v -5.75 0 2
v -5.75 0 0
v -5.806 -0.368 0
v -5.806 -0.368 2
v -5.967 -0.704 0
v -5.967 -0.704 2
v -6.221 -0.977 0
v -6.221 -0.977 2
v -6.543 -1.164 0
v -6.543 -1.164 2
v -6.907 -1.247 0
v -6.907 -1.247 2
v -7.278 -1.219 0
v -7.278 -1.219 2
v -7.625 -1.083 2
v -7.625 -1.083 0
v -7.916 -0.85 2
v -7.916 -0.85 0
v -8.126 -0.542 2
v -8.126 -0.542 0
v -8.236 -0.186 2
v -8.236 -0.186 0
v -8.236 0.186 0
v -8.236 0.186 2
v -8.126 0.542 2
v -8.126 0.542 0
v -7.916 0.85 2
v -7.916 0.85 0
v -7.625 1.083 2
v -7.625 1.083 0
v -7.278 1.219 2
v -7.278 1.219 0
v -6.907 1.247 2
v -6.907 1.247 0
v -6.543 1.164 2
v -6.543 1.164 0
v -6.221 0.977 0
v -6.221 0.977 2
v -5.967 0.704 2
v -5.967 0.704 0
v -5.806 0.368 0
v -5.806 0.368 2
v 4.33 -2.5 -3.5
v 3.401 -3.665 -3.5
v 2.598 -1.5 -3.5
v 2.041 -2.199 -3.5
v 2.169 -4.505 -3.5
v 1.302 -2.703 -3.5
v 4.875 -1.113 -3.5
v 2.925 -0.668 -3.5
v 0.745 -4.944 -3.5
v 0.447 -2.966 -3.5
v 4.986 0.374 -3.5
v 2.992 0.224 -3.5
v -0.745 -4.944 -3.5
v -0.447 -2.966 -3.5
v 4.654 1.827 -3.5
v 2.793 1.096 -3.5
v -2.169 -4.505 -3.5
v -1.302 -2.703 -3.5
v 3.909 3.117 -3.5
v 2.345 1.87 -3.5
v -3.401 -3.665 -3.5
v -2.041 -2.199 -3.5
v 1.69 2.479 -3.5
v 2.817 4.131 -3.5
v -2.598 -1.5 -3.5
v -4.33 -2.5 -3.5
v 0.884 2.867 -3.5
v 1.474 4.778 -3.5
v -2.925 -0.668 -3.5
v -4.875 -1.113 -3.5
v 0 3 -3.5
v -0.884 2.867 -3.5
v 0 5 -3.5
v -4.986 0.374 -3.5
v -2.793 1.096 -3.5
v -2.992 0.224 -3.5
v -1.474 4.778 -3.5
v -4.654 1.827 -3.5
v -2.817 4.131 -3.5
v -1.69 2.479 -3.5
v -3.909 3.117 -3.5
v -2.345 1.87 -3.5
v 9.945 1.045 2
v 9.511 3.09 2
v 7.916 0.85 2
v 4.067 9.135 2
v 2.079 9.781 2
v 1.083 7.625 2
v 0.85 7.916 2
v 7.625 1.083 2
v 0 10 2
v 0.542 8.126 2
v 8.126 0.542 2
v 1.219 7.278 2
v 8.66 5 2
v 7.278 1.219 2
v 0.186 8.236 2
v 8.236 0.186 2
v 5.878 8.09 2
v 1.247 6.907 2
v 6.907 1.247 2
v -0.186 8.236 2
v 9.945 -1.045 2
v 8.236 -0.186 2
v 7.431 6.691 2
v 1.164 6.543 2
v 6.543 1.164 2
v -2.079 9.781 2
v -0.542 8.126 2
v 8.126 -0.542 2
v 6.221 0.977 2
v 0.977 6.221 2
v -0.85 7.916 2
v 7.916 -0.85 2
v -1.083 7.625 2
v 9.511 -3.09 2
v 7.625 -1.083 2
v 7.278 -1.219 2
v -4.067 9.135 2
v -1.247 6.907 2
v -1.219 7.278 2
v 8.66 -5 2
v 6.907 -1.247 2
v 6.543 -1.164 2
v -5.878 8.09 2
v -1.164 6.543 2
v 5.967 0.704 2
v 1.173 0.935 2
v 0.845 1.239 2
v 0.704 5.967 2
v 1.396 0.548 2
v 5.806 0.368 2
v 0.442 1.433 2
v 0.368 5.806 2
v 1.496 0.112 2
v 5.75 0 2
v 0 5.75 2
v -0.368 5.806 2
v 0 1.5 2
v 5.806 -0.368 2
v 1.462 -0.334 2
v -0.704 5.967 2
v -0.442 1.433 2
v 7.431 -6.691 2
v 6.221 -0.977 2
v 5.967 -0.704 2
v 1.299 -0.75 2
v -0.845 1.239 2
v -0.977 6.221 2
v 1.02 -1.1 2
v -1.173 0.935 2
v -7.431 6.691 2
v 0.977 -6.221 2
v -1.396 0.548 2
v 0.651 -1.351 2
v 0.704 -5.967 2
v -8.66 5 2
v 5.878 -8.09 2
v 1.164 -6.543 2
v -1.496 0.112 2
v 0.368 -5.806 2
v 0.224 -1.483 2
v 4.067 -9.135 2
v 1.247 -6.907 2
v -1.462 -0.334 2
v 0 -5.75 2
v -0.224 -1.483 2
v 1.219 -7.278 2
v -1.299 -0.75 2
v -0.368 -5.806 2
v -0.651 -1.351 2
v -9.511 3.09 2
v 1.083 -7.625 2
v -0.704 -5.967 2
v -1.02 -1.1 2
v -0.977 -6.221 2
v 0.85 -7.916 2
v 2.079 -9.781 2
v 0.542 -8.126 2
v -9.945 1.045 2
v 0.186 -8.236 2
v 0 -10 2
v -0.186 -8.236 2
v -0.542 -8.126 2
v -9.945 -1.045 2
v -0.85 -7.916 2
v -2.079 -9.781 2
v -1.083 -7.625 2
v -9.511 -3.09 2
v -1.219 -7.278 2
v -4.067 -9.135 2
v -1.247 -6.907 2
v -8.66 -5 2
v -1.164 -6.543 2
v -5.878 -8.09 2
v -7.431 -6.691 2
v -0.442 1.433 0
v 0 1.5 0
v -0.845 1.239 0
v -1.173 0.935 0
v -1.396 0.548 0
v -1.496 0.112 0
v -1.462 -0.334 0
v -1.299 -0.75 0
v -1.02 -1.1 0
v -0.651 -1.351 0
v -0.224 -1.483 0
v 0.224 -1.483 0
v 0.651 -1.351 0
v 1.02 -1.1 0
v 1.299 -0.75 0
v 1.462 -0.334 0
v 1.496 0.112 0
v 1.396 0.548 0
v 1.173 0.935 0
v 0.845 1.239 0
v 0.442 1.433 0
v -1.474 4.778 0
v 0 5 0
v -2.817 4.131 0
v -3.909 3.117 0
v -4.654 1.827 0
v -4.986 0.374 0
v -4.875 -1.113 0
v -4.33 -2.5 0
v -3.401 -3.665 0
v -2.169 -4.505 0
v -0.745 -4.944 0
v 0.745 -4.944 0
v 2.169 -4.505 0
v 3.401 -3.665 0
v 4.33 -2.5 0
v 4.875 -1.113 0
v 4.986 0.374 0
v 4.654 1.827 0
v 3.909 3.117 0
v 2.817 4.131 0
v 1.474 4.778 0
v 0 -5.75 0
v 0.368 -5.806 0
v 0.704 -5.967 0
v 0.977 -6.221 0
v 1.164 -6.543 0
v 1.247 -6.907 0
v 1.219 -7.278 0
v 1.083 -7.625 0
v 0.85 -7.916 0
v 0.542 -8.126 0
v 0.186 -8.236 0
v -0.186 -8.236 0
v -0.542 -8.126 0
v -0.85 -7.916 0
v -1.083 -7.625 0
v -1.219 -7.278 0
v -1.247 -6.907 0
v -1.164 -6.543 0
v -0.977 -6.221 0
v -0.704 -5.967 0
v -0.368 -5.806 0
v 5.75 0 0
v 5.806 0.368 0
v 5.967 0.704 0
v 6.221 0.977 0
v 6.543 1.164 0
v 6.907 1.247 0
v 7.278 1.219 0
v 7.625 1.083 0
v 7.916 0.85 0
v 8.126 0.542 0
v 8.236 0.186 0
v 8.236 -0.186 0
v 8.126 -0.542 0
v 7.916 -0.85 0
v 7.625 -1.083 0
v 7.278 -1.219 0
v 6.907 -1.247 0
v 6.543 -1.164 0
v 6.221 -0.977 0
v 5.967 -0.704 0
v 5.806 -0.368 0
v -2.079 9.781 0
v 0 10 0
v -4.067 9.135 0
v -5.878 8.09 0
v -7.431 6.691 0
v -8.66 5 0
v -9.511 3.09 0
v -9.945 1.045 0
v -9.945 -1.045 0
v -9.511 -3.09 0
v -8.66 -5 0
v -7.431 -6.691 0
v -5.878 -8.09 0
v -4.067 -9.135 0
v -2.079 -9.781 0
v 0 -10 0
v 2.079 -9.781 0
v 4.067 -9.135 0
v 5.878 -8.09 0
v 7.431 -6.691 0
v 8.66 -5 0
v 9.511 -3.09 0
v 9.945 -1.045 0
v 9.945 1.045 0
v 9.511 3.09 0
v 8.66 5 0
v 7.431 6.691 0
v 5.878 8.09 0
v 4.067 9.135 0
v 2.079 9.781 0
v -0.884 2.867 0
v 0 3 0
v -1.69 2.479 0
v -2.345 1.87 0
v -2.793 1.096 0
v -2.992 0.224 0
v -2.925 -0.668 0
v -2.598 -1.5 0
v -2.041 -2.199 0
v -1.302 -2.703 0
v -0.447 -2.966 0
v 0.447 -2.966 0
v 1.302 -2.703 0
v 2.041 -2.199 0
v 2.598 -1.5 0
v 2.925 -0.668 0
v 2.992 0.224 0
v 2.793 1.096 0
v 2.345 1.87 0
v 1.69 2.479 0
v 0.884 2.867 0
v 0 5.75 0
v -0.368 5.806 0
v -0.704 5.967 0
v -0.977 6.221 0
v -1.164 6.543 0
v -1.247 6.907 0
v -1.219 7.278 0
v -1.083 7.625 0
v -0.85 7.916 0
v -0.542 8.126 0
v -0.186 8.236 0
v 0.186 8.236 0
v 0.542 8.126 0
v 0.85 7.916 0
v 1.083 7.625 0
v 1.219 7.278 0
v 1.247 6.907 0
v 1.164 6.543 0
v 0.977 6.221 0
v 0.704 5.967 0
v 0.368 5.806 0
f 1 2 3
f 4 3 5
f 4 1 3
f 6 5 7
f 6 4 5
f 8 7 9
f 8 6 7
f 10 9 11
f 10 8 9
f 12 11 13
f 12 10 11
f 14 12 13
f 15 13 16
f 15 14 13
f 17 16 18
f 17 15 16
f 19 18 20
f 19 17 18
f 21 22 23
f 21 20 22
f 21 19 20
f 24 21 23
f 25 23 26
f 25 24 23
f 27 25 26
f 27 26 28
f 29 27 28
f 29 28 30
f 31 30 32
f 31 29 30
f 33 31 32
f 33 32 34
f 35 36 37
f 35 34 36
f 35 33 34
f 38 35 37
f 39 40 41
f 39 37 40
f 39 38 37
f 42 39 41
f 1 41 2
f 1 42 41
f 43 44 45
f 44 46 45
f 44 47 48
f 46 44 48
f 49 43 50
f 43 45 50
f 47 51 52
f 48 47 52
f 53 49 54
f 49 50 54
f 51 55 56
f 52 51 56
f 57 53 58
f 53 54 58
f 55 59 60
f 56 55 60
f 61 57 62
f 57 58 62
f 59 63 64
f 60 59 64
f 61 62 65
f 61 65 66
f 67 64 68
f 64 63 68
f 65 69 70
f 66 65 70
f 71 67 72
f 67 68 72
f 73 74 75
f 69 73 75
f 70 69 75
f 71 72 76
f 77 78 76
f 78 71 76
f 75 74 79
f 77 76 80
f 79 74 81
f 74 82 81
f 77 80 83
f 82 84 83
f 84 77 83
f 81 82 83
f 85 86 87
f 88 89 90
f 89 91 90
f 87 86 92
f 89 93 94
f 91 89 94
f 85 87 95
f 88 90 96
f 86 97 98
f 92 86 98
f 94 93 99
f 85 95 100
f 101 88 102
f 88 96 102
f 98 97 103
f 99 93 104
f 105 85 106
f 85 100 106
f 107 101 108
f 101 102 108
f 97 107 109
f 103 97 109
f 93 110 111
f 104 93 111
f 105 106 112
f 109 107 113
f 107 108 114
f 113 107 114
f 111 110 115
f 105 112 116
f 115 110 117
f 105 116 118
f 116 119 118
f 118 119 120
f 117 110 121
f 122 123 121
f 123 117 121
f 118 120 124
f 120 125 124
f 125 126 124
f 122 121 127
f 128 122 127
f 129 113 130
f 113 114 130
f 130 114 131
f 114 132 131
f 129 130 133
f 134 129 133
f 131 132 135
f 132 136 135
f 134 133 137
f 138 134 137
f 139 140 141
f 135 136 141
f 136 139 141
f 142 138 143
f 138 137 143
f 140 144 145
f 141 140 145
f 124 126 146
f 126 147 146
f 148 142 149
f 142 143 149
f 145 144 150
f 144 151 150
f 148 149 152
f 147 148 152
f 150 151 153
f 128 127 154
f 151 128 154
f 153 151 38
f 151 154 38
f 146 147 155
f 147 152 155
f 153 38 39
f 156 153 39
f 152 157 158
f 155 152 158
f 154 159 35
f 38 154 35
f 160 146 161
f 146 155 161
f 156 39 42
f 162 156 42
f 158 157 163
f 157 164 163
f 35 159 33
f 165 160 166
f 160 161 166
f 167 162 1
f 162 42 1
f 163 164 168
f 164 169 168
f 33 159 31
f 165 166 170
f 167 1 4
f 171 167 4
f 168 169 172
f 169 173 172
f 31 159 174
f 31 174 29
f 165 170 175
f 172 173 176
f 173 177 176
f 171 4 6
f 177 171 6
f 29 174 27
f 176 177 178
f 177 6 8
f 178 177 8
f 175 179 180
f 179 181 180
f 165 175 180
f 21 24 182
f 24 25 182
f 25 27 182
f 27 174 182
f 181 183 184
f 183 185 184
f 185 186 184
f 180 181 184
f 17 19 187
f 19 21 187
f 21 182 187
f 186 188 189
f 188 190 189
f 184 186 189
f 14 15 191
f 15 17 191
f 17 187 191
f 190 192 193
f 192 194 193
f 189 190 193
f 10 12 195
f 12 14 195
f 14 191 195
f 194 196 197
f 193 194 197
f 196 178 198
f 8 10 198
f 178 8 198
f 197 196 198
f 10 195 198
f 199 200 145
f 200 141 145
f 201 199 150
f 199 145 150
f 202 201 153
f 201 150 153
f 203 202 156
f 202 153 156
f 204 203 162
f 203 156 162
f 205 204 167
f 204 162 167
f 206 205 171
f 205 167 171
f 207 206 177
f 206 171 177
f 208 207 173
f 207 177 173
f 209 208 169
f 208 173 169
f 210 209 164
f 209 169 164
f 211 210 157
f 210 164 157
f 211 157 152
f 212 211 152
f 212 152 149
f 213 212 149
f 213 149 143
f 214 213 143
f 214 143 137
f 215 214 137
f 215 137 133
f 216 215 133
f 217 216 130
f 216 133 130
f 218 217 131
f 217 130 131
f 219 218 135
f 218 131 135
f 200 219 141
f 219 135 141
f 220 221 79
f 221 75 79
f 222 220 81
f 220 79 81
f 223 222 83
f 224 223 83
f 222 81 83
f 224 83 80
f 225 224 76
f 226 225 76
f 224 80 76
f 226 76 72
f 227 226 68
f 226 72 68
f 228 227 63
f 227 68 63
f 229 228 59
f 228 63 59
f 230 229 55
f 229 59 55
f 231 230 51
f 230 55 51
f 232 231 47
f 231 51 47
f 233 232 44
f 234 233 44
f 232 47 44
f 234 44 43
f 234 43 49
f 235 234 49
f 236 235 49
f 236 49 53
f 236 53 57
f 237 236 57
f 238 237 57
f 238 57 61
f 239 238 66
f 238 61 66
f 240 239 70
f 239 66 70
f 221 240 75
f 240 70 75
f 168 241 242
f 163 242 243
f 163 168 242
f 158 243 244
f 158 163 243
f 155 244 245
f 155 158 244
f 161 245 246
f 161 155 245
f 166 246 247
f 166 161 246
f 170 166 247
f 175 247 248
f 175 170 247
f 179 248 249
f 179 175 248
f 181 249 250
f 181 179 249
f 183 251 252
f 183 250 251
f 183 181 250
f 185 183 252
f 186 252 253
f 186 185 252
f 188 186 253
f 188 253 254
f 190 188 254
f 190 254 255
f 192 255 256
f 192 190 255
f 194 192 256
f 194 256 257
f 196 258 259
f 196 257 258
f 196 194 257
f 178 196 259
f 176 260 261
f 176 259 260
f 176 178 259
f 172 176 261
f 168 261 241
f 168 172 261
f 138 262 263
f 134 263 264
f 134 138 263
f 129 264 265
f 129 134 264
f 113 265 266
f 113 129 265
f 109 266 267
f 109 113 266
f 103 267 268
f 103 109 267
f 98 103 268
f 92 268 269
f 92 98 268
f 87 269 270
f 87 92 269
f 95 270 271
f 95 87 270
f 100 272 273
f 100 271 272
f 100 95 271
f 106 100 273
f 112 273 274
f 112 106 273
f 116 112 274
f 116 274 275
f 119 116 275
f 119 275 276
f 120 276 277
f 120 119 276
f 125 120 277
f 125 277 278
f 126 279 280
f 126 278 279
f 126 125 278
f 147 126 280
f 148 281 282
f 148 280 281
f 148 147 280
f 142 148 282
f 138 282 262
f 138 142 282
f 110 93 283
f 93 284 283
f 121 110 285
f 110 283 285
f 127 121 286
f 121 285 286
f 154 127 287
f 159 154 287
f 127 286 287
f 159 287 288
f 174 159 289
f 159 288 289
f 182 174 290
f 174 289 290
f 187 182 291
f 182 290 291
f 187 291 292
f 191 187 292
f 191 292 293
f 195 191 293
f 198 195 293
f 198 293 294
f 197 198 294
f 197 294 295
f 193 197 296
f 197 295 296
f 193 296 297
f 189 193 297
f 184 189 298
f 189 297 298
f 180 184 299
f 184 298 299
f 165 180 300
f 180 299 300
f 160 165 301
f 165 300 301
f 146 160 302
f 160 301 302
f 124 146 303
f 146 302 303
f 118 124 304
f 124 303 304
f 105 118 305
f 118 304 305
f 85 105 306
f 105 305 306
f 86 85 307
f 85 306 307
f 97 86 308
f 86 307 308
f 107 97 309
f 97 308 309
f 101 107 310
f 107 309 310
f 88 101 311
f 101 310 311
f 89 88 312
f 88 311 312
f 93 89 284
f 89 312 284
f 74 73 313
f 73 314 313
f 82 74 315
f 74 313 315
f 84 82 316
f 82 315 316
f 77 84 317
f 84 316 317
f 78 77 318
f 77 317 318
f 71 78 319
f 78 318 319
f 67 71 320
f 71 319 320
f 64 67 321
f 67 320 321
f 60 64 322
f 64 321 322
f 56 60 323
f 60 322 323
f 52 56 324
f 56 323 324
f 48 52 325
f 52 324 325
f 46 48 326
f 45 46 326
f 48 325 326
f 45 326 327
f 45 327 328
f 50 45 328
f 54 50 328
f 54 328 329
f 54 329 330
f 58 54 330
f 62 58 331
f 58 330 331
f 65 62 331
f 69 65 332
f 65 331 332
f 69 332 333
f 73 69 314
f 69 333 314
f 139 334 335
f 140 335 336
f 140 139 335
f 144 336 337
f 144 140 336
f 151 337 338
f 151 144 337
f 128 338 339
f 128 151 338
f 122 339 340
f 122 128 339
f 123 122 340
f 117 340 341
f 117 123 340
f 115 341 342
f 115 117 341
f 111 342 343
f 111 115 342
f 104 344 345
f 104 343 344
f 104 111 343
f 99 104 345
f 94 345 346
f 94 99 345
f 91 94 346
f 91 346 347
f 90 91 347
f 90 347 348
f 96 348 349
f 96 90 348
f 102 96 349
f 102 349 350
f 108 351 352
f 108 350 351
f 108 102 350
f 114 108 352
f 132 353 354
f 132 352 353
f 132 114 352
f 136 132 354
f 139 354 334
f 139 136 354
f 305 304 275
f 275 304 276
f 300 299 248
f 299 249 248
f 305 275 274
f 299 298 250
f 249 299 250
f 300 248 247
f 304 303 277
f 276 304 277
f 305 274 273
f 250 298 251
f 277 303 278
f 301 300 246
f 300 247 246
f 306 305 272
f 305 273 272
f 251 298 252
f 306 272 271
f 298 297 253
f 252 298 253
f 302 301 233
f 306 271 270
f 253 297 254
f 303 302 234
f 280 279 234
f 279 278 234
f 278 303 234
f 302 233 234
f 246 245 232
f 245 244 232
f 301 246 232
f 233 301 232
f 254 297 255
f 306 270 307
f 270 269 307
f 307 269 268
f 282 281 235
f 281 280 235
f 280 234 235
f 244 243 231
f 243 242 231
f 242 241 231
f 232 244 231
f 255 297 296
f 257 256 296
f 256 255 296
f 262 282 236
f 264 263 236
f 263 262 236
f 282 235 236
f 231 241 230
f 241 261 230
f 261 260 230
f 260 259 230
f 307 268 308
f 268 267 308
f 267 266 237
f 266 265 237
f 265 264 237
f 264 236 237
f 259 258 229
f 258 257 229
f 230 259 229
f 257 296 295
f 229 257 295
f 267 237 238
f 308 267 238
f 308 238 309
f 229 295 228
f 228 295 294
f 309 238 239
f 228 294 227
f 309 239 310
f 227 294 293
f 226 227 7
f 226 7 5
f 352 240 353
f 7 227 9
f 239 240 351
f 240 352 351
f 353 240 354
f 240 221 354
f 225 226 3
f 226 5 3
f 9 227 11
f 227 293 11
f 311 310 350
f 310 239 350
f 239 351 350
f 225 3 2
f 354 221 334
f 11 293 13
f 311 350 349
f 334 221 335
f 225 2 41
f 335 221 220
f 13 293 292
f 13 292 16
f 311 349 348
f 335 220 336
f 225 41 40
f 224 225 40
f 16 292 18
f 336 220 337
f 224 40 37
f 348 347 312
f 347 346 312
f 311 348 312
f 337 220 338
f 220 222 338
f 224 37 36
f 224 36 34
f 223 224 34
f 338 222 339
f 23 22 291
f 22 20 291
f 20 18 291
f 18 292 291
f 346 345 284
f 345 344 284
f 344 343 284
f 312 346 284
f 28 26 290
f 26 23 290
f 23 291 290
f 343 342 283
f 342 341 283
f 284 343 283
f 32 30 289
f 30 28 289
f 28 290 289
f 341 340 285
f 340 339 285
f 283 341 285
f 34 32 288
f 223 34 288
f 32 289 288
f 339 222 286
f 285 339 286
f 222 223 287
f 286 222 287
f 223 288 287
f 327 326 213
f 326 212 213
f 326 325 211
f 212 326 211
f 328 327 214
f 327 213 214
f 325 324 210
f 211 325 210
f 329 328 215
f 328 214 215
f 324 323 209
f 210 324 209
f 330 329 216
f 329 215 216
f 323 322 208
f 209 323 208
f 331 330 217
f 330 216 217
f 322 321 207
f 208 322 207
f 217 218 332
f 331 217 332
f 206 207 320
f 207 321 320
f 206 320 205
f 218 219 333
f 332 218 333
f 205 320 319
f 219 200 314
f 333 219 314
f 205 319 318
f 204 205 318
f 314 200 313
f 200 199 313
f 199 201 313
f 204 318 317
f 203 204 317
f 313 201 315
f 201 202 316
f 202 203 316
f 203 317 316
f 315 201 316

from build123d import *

# Parameters (mm, degrees)
PATTERN_CIRCULAR_1_COUNT = 4


with BuildPart() as part:
    # 草图2 → 旋转1 (revolve)
    with BuildSketch(Plane(origin=(0, 0, 0), x_dir=(0, 0, -1), z_dir=(1, 0, 0))):
        Polygon((-2, 1.5), (-2, 10), (0, 10), (0, 5), (3.5, 5), (3.5, 3), (0, 3), (0, 1.5), align=None)
    revolve(axis=Axis((0, 0, 0), (0, 0, 1)))

    # 草图4 → M3 螺纹孔1 (revolve, cut)
    with BuildSketch(Plane(origin=(0, 7, 2), x_dir=(0, -1, 0), z_dir=(1, 0, 0))):
        Polygon((0, 0), (0, 8.251075774), (1.25, 7.5), (1.25, 0), align=None)
    hole_wizard_m3_1 = revolve(axis=Axis((0, 7, 8.35), (0, 0, -1)), mode=Mode.SUBTRACT)

    # 阵列(圆周)1: M3 螺纹孔1 ×4 about axis
    pattern_circular_1_axis = Axis((0, 0, 0), (0, 0, 1))
    for i in range(1, PATTERN_CIRCULAR_1_COUNT):
        add(hole_wizard_m3_1.rotate(pattern_circular_1_axis, i * 360 / PATTERN_CIRCULAR_1_COUNT), mode=Mode.SUBTRACT)


solid = part.part
